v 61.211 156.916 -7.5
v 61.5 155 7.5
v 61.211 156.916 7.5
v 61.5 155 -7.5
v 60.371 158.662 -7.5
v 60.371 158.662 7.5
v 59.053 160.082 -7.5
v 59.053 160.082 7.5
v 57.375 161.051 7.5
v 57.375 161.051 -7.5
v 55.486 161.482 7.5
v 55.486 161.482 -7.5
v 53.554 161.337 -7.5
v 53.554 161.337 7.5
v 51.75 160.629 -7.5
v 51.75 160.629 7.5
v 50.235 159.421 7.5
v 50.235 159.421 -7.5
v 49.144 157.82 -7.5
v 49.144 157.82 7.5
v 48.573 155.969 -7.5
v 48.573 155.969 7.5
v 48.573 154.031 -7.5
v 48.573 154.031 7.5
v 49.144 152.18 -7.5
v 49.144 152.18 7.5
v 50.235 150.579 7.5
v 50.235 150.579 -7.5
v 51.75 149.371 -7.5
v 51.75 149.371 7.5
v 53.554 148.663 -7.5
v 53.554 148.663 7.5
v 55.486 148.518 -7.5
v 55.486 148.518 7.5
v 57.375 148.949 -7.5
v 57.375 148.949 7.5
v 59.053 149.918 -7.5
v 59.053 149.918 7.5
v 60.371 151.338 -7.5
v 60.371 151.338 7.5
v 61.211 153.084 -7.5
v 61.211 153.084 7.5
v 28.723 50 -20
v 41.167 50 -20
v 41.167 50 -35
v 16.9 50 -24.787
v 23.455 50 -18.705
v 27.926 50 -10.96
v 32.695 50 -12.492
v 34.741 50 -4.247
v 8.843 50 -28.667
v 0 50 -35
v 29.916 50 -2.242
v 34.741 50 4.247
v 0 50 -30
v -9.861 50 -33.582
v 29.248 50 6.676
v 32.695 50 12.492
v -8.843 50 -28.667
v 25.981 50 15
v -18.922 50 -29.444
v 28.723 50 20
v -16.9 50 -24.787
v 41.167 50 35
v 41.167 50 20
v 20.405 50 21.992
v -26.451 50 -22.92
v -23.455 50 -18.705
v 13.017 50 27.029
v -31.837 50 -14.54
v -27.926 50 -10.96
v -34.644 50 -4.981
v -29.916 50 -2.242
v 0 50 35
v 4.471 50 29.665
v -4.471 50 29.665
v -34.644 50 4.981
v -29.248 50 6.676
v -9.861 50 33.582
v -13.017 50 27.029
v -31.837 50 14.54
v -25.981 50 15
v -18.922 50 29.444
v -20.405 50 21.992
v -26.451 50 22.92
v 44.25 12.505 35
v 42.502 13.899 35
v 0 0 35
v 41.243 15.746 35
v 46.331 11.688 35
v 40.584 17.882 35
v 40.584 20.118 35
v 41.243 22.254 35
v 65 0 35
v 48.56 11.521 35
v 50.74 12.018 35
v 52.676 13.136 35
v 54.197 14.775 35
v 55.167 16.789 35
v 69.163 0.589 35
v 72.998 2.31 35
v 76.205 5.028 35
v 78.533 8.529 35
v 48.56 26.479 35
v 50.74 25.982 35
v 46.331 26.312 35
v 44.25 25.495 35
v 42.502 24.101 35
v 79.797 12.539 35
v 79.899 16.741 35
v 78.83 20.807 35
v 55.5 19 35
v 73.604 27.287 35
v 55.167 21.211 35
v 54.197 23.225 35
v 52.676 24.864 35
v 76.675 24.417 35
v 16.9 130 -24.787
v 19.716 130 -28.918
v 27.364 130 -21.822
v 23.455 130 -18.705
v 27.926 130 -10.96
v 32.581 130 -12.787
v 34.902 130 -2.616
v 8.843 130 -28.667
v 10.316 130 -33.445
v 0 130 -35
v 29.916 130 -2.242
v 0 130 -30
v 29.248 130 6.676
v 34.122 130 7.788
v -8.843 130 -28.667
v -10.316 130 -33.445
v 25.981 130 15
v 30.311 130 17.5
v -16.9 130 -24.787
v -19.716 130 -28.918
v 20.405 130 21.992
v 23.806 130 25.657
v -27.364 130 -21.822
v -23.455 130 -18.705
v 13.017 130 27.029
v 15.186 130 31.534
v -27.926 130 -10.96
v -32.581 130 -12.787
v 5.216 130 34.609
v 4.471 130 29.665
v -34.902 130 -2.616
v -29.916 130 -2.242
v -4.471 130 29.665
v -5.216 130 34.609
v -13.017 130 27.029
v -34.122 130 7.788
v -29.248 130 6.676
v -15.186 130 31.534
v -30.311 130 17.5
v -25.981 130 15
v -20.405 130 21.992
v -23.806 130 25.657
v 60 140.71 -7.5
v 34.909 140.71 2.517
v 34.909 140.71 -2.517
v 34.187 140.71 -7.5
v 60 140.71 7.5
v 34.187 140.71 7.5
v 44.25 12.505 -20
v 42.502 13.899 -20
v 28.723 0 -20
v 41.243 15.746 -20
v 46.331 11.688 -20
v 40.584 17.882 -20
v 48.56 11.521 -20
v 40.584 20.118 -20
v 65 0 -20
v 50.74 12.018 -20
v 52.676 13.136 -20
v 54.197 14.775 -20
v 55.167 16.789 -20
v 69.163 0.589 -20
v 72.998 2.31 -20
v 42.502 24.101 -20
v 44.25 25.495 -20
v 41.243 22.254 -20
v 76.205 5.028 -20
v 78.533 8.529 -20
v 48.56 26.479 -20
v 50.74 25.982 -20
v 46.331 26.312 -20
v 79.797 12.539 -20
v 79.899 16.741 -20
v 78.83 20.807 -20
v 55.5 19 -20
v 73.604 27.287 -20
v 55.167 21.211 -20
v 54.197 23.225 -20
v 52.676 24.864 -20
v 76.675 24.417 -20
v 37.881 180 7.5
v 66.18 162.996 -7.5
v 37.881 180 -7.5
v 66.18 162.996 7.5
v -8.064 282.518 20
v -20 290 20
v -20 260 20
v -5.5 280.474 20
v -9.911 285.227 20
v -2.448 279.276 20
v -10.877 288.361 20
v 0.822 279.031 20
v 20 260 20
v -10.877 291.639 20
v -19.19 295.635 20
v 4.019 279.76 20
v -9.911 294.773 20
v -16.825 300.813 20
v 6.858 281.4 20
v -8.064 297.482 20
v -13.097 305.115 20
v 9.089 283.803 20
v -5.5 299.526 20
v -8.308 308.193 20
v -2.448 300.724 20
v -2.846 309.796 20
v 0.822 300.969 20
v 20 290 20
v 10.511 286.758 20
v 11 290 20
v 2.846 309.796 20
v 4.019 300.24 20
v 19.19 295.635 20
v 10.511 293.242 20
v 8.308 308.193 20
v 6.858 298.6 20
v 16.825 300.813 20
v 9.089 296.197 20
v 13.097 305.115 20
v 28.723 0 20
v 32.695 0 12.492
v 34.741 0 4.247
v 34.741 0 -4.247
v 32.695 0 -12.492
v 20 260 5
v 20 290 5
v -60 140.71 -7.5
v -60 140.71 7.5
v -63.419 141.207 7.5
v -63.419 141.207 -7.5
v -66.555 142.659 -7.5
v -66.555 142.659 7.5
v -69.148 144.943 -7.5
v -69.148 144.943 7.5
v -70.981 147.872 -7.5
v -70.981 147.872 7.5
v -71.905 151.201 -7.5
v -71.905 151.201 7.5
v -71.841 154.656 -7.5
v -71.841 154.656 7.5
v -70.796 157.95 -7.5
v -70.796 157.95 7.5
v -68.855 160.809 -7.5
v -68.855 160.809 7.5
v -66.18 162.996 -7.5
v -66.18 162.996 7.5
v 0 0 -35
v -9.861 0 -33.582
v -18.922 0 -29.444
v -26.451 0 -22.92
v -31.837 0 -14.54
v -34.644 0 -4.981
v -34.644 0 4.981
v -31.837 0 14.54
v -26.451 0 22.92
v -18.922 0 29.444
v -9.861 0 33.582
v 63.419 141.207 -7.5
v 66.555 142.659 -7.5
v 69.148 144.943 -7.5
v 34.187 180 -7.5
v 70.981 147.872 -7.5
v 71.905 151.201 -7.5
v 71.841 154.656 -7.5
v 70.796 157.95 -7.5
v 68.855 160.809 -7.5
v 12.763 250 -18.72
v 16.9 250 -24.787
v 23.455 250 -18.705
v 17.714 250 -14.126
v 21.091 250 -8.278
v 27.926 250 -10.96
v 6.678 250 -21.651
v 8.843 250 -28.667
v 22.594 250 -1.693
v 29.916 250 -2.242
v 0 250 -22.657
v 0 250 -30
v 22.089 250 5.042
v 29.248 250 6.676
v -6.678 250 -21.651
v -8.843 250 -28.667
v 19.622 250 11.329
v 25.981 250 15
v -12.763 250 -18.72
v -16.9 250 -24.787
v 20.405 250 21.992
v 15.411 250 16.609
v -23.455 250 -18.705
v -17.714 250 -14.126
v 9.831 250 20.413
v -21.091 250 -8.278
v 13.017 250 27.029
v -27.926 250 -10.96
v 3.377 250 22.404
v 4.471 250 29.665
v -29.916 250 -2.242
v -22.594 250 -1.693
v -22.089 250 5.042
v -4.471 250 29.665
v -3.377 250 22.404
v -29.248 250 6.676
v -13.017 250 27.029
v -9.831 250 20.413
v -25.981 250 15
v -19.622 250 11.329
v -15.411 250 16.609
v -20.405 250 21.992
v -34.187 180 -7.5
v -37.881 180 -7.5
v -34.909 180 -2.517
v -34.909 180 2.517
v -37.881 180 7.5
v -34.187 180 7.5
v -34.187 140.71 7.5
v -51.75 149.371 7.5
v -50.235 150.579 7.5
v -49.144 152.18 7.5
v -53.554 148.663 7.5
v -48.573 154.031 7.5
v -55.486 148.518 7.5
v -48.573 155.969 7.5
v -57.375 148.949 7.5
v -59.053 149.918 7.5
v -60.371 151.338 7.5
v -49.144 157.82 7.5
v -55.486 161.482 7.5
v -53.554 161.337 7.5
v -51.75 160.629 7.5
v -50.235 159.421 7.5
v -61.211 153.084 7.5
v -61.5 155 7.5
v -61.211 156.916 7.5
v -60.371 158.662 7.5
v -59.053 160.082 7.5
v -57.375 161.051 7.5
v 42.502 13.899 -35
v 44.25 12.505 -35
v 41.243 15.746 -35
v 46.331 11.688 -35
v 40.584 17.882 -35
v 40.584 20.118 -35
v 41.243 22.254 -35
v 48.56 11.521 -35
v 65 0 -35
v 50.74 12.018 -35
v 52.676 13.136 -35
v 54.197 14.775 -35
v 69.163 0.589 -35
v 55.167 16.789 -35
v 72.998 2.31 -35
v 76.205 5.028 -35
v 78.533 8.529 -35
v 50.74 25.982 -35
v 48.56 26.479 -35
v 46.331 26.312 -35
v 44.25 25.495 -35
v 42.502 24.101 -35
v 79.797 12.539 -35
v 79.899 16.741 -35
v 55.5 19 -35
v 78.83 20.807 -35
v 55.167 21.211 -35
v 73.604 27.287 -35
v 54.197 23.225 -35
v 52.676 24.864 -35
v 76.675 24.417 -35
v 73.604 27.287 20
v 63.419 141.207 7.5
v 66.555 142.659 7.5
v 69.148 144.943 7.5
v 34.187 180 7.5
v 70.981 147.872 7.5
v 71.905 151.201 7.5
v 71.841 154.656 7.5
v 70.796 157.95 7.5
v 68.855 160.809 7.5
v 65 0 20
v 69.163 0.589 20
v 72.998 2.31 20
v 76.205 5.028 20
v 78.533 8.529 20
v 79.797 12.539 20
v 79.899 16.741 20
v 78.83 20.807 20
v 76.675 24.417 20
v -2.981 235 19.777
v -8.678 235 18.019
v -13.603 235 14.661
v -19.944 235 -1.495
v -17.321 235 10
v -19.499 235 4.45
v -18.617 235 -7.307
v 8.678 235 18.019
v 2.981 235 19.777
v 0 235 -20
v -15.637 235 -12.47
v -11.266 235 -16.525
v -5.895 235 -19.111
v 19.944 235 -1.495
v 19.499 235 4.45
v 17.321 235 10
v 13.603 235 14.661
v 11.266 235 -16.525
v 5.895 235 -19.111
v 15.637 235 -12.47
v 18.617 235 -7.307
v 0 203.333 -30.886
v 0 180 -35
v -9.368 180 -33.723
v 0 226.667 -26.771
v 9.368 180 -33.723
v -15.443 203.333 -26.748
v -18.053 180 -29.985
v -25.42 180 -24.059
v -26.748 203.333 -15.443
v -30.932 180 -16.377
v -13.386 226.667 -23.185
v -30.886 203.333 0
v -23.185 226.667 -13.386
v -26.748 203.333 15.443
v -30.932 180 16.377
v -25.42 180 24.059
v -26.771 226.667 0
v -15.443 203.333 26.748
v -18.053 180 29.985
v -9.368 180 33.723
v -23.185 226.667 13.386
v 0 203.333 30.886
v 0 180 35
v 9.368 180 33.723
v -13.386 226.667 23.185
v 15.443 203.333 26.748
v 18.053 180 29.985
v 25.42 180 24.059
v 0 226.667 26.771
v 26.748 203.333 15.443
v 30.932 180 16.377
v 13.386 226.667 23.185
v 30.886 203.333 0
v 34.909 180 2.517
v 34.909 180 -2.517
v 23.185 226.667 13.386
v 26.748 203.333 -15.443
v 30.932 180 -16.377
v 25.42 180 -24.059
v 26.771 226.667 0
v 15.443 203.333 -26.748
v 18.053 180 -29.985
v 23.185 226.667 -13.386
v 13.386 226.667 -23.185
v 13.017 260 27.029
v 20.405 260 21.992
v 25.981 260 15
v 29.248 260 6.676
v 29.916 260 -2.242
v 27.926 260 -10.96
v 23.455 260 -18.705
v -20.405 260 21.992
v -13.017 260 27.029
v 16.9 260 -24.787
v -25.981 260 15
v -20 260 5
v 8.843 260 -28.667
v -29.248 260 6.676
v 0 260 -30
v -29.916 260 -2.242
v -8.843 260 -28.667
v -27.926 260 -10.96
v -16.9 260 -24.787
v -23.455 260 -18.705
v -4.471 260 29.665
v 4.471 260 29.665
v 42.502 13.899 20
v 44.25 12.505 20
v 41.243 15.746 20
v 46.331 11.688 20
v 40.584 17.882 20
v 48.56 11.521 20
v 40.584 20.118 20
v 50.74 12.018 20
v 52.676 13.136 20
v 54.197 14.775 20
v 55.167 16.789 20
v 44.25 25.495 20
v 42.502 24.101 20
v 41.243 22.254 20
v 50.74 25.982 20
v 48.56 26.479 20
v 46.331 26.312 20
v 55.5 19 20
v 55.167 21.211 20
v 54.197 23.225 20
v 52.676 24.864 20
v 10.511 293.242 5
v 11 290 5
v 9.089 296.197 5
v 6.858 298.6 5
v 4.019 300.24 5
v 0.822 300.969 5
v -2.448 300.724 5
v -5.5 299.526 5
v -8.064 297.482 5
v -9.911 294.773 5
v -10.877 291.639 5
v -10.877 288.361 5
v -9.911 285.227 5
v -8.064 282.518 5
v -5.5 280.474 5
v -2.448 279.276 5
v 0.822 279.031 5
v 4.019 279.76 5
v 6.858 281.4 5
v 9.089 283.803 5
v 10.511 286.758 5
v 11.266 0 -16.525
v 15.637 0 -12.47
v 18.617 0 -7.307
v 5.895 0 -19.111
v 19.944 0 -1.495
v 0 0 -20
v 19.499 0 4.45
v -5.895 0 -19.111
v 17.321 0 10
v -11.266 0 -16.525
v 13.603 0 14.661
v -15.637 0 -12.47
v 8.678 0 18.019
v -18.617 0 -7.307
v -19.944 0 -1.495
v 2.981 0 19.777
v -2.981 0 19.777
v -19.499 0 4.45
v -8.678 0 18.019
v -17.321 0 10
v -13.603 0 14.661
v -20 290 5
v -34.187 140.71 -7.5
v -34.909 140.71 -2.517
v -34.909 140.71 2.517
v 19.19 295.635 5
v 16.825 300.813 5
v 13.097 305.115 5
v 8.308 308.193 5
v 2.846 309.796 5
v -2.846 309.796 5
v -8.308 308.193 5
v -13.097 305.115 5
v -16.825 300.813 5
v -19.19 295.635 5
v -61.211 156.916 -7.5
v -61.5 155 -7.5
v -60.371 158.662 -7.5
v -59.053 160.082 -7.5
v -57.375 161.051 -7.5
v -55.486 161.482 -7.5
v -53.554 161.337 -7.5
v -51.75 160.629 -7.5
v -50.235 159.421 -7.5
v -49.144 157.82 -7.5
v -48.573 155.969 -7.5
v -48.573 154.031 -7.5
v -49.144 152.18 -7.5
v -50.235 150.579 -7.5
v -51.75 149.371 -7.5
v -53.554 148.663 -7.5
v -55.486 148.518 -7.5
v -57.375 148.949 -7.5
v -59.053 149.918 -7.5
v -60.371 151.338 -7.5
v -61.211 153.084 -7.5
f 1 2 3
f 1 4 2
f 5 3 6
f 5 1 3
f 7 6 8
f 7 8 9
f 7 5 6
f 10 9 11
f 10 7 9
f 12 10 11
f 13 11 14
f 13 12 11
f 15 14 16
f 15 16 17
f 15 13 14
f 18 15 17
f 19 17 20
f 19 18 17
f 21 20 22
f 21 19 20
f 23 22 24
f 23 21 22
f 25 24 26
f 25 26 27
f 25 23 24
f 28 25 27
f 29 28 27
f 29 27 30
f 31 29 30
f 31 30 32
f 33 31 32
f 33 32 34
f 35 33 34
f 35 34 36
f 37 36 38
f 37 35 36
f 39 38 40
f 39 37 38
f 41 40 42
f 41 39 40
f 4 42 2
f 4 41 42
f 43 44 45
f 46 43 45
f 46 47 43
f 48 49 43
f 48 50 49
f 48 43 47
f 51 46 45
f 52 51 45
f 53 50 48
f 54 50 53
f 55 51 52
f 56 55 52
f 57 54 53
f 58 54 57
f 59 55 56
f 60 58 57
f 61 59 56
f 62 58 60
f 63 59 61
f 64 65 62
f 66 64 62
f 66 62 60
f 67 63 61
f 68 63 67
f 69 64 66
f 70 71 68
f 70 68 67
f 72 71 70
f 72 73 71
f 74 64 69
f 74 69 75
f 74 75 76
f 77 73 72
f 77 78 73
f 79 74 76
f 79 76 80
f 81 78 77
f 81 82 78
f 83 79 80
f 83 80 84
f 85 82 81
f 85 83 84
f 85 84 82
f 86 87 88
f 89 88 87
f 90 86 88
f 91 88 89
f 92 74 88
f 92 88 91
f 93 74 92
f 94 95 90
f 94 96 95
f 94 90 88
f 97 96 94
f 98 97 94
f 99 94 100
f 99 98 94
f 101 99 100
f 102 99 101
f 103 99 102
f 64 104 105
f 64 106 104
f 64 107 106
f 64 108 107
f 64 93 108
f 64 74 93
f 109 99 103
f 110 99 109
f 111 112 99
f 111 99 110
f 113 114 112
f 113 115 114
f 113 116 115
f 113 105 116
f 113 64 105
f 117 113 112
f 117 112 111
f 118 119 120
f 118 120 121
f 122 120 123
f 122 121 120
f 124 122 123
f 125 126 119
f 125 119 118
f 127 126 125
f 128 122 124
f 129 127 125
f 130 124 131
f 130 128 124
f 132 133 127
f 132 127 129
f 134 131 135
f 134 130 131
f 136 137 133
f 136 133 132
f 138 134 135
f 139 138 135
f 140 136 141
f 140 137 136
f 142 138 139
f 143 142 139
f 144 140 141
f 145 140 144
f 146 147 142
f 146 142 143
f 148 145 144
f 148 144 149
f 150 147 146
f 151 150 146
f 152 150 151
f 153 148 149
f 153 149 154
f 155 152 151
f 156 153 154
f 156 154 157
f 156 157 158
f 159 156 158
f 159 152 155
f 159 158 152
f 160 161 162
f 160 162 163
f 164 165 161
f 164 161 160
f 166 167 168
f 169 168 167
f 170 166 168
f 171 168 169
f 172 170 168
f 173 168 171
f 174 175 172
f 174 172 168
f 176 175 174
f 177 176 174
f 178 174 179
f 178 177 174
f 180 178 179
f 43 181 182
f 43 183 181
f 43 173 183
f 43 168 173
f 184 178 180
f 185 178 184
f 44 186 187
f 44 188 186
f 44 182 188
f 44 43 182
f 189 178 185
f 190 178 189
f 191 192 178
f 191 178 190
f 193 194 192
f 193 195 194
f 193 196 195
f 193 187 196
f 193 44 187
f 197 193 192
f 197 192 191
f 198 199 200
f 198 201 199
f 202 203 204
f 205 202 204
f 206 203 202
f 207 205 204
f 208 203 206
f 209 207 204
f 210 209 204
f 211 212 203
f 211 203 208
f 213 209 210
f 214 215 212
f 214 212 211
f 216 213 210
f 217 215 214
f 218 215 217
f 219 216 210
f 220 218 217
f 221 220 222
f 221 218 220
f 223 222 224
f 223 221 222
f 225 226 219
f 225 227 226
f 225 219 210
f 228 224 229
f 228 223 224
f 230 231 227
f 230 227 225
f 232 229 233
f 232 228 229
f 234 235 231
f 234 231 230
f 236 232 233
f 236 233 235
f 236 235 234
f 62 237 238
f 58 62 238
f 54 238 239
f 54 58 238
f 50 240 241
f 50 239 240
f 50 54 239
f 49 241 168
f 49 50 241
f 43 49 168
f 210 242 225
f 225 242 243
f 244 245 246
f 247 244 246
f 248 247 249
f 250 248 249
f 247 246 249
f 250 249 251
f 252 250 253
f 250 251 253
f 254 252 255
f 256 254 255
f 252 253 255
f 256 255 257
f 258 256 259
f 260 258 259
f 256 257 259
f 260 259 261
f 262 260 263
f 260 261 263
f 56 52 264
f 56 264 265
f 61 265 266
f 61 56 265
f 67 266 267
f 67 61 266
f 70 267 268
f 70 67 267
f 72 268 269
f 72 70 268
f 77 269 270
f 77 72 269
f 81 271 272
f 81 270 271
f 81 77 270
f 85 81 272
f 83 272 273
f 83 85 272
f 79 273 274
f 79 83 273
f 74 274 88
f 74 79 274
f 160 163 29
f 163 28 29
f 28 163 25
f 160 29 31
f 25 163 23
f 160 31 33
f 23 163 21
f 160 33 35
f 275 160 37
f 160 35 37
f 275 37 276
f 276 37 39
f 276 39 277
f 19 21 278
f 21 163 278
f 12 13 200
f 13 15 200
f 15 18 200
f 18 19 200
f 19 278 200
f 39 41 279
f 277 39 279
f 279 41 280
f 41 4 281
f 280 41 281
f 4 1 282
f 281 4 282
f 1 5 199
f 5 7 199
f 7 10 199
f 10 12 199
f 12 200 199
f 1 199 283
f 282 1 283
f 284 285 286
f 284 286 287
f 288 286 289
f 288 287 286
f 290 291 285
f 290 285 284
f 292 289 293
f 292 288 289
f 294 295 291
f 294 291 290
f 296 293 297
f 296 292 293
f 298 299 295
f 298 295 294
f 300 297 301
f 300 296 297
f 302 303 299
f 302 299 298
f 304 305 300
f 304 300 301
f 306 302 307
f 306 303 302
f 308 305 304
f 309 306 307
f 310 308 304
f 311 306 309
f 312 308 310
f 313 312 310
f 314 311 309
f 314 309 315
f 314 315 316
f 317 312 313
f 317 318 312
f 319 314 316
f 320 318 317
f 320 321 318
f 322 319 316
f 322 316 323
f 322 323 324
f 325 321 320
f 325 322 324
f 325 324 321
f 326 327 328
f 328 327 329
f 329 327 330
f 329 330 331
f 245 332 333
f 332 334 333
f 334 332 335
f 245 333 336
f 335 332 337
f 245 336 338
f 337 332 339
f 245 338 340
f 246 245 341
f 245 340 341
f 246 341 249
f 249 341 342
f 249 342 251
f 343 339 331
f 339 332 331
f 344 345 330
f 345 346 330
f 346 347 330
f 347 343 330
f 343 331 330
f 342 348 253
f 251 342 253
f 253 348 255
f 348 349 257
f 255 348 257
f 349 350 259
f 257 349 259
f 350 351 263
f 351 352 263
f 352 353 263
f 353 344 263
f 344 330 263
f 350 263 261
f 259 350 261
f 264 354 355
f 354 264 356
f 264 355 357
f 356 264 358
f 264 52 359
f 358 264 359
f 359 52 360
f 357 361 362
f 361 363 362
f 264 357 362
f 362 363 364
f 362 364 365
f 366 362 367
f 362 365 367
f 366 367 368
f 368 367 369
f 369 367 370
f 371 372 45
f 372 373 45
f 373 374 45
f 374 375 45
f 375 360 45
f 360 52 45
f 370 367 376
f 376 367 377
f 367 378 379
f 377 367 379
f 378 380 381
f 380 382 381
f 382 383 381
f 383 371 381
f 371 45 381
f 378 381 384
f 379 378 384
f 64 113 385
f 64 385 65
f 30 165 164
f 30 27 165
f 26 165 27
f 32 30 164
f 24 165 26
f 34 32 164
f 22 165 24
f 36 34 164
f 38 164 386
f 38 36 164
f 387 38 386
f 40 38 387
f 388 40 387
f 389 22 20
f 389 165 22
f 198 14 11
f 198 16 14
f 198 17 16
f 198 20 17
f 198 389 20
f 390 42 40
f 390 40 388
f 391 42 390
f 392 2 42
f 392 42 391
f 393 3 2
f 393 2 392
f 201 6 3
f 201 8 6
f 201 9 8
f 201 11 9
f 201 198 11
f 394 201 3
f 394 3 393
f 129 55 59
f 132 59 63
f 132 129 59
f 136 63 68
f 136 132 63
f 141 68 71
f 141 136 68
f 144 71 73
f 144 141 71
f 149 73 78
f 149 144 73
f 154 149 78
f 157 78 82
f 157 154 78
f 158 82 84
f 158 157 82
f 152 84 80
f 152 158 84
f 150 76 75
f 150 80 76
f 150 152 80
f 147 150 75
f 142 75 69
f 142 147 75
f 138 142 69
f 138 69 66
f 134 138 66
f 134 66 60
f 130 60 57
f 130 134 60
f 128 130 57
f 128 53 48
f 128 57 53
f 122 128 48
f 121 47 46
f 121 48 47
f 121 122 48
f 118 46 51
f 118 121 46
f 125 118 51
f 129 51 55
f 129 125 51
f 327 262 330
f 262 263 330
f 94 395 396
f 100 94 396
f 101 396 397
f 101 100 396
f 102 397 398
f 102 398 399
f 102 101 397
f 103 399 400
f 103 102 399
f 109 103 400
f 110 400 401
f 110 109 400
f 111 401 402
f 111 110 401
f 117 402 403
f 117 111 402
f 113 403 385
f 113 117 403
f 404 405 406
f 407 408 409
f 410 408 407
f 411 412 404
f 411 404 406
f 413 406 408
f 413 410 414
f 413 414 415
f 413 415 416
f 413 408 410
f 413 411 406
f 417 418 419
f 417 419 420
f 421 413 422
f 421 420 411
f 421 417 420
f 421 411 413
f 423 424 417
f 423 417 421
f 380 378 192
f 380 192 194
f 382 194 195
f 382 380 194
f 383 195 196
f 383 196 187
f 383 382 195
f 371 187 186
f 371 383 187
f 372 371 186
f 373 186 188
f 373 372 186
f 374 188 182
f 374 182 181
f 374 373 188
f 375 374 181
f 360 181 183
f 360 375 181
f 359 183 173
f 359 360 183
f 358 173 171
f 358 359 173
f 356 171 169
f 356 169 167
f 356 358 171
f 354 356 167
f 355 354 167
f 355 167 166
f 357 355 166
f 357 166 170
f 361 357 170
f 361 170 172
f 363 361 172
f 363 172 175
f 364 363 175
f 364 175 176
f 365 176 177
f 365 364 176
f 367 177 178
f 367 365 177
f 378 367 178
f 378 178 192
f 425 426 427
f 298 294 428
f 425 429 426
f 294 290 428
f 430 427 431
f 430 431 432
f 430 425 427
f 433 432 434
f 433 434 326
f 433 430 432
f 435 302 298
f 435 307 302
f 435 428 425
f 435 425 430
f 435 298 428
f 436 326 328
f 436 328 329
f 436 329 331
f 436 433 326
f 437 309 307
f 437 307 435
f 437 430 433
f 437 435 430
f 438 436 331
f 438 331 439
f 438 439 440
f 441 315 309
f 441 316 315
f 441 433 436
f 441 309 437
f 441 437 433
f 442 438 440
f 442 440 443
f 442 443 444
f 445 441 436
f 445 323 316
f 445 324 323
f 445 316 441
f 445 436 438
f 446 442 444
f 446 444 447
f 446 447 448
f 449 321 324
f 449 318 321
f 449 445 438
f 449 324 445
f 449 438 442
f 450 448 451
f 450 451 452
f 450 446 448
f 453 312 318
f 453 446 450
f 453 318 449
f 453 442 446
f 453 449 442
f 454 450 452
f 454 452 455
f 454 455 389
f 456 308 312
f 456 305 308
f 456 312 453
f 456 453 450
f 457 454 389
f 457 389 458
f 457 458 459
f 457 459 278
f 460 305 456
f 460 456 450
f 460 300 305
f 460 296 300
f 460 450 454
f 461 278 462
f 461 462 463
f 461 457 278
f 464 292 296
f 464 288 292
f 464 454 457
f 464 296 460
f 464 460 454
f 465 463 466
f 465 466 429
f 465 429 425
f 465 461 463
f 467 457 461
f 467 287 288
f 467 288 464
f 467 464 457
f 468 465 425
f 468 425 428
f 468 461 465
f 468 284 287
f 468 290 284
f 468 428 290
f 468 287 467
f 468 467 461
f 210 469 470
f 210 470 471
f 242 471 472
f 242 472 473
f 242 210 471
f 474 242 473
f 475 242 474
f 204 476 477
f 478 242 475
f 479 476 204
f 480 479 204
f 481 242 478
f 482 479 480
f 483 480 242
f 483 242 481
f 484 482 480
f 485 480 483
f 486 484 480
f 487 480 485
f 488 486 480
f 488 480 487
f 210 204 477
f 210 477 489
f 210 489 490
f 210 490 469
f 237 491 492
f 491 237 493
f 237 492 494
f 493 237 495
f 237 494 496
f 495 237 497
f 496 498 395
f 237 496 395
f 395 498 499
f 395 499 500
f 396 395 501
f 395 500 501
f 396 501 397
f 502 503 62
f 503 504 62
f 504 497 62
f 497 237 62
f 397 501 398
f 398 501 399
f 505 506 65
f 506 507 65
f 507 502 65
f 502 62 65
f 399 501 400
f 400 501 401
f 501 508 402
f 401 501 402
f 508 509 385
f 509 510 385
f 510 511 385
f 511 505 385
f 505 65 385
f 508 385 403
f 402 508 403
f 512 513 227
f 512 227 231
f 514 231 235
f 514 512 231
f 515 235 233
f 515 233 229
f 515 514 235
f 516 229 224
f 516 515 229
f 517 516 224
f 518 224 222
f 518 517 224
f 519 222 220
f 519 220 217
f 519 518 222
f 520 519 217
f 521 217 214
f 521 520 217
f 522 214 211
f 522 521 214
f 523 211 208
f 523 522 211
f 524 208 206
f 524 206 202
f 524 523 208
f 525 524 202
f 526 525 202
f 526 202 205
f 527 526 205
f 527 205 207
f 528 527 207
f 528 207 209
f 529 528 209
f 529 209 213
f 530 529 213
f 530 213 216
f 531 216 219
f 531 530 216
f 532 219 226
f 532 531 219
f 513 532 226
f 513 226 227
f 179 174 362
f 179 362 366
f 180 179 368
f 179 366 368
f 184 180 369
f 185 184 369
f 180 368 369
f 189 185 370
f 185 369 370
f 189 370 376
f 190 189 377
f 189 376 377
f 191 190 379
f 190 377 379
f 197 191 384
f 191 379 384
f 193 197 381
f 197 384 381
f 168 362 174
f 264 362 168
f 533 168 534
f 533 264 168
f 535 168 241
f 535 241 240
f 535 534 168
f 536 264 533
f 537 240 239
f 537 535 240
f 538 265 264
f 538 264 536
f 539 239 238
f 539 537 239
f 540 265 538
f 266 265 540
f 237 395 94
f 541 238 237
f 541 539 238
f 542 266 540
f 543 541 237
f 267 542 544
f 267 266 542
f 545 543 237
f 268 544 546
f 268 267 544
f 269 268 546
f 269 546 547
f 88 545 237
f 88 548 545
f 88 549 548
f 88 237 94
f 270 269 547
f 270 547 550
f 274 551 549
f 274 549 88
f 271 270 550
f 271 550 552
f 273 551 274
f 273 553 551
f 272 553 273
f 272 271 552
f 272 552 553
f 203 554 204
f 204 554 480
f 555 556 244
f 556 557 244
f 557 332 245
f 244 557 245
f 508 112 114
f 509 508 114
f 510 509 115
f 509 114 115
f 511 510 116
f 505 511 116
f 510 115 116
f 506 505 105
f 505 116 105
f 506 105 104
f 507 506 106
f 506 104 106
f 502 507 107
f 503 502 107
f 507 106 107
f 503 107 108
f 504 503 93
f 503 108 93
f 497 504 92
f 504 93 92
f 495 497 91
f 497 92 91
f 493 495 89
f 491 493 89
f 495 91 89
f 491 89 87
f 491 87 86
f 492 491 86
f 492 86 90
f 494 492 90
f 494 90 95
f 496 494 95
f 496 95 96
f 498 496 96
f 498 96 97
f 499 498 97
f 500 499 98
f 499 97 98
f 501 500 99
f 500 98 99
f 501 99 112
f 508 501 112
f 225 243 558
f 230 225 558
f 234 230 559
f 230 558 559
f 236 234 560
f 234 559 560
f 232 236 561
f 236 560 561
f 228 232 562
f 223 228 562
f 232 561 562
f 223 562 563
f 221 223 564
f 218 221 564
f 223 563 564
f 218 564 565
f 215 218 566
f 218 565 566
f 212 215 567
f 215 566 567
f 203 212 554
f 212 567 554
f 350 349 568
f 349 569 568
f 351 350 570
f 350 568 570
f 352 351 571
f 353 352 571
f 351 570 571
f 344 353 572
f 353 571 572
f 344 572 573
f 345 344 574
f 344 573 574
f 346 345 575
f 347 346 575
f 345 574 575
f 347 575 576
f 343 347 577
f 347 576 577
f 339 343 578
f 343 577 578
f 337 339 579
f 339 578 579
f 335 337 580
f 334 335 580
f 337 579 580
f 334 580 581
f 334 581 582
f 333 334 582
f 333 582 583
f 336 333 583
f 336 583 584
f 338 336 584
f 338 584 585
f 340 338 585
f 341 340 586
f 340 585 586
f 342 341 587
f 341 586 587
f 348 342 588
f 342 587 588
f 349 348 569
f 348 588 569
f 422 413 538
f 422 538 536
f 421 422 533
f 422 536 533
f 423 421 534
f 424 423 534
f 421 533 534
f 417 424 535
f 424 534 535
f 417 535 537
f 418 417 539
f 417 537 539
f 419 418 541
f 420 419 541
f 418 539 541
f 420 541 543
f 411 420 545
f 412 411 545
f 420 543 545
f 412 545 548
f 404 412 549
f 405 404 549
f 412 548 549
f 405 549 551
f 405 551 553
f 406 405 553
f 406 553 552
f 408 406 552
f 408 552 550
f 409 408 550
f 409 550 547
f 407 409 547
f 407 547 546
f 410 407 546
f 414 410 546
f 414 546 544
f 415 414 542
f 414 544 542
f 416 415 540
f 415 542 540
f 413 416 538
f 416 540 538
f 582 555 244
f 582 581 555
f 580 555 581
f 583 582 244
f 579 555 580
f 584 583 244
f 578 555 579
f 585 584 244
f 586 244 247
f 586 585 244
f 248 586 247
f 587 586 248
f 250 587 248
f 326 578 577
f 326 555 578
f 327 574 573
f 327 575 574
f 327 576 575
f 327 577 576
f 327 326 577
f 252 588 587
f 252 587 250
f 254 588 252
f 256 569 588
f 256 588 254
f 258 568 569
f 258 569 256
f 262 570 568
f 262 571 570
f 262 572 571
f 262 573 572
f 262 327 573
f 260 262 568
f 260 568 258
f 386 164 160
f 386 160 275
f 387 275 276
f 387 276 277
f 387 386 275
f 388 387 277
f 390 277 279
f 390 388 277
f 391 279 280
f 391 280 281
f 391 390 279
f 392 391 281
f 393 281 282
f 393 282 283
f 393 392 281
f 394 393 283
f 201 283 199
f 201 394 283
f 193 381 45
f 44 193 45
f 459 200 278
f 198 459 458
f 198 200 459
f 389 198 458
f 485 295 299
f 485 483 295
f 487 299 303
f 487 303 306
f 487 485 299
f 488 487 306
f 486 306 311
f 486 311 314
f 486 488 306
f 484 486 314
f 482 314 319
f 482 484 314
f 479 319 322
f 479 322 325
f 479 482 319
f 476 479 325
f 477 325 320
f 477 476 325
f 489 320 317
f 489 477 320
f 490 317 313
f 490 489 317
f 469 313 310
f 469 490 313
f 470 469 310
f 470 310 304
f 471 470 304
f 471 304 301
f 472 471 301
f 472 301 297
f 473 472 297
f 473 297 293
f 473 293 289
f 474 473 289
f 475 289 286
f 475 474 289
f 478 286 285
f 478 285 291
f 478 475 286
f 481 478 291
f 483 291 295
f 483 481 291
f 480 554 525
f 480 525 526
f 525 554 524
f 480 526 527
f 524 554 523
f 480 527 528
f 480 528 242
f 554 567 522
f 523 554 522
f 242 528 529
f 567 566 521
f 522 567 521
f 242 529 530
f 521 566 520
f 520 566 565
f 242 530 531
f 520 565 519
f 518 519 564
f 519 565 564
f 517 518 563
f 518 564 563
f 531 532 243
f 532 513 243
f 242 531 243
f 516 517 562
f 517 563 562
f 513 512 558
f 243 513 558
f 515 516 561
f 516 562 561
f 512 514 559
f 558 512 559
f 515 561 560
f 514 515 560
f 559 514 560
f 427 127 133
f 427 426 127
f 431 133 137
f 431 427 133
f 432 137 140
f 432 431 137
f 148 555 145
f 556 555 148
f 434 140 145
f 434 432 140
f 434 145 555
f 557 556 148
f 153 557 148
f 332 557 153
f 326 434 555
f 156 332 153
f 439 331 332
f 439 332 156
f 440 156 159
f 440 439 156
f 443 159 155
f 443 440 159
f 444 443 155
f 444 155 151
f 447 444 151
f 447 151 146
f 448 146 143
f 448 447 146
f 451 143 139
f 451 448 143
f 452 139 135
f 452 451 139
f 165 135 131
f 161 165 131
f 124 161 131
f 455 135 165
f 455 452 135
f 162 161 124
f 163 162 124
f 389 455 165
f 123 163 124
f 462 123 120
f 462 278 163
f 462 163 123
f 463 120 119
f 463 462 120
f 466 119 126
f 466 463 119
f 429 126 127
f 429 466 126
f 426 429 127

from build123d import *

# Parameters (mm, degrees)
SKETCH2_R           = 7.5
BOSS_EXTRUDE1_DEPTH = 15
SKETCH3_R           = 6.5
BOSS_EXTRUDE2_DEPTH = 7.5
SKETCH4_R           = 11
BOSS_EXTRUDE3_DEPTH = 15
SKETCH5_R           = 20
CUT_EXTRUDE1_DEPTH  = 235


with BuildPart() as part:
    # Sketch1 → Revolve1 (revolve)
    with BuildSketch(Plane.XY):
        Polygon((0, 0), (35, 0), (35, 50), (30, 50), (30, 130), (35, 130), (35, 180), (22.65711135, 250), (30, 250), (30, 260), (0, 260), align=None)
    revolve(axis=Axis((0, 0, 0), (0, 1, 0)))

    # Sketch2 → Boss-Extrude1 (add)
    with BuildSketch(Plane.XY.offset(35)):
        with BuildLine():
            Line((0, 0), (48, 0))
            Line((48, 0), (65, 0))
            ThreePointArc((65, 0), (79.305754261, 10.489413007), (73.603646545, 27.287280664))
            Line((73.603646545, 27.287280664), (41.166521698, 50))
            Line((41.166521698, 50), (0, 50))
            Line((0, 50), (0, 0))
        make_face()
        with Locations((48, 19)):
            Circle(SKETCH2_R, mode=Mode.SUBTRACT)
    boss_extrude1 = extrude(amount=-BOSS_EXTRUDE1_DEPTH)

    # Mirror1: Boss-Extrude1 across plane
    add(boss_extrude1.mirror(Plane.XY))

    # Sketch3 → Boss-Extrude2 (add, symmetric)
    with BuildSketch(Plane.XY):
        with BuildLine():
            Line((0, 180), (0, 140.71))
            Line((0, 140.71), (55, 140.71))
            Line((55, 140.71), (60, 140.71))
            ThreePointArc((60, 140.71), (71.563565439, 149.503139487), (66.180456899, 162.996007608))
            Line((66.180456899, 162.996007608), (37.881061244, 180))
            Line((37.881061244, 180), (0, 180))
        make_face()
        with Locations((55, 155)):
            Circle(SKETCH3_R, mode=Mode.SUBTRACT)
    boss_extrude2 = extrude(amount=BOSS_EXTRUDE2_DEPTH, both=True)

    # Mirror2: Boss-Extrude2 across plane
    add(boss_extrude2.mirror(Plane(origin=(0, 0, 0), x_dir=(0, 0, 1), z_dir=(1, 0, 0))))

    # Sketch4 → Boss-Extrude3 (add)
    with BuildSketch(Plane.XY.offset(5)):
        with BuildLine():
            Line((-20, 290), (-20, 258.467022151))
            Line((-20, 258.467022151), (20, 258.467022151))
            Line((20, 258.467022151), (20, 290))
            ThreePointArc((20, 290), (0, 310), (-20, 290))
        make_face()
        with Locations((0, 290)):
            Circle(SKETCH4_R, mode=Mode.SUBTRACT)
    extrude(amount=BOSS_EXTRUDE3_DEPTH)

    # Sketch5 → Cut-Extrude1 (cut)
    with BuildSketch(Plane.XZ):
        Circle(SKETCH5_R)
    extrude(amount=-CUT_EXTRUDE1_DEPTH, mode=Mode.SUBTRACT)


solid = part.part
